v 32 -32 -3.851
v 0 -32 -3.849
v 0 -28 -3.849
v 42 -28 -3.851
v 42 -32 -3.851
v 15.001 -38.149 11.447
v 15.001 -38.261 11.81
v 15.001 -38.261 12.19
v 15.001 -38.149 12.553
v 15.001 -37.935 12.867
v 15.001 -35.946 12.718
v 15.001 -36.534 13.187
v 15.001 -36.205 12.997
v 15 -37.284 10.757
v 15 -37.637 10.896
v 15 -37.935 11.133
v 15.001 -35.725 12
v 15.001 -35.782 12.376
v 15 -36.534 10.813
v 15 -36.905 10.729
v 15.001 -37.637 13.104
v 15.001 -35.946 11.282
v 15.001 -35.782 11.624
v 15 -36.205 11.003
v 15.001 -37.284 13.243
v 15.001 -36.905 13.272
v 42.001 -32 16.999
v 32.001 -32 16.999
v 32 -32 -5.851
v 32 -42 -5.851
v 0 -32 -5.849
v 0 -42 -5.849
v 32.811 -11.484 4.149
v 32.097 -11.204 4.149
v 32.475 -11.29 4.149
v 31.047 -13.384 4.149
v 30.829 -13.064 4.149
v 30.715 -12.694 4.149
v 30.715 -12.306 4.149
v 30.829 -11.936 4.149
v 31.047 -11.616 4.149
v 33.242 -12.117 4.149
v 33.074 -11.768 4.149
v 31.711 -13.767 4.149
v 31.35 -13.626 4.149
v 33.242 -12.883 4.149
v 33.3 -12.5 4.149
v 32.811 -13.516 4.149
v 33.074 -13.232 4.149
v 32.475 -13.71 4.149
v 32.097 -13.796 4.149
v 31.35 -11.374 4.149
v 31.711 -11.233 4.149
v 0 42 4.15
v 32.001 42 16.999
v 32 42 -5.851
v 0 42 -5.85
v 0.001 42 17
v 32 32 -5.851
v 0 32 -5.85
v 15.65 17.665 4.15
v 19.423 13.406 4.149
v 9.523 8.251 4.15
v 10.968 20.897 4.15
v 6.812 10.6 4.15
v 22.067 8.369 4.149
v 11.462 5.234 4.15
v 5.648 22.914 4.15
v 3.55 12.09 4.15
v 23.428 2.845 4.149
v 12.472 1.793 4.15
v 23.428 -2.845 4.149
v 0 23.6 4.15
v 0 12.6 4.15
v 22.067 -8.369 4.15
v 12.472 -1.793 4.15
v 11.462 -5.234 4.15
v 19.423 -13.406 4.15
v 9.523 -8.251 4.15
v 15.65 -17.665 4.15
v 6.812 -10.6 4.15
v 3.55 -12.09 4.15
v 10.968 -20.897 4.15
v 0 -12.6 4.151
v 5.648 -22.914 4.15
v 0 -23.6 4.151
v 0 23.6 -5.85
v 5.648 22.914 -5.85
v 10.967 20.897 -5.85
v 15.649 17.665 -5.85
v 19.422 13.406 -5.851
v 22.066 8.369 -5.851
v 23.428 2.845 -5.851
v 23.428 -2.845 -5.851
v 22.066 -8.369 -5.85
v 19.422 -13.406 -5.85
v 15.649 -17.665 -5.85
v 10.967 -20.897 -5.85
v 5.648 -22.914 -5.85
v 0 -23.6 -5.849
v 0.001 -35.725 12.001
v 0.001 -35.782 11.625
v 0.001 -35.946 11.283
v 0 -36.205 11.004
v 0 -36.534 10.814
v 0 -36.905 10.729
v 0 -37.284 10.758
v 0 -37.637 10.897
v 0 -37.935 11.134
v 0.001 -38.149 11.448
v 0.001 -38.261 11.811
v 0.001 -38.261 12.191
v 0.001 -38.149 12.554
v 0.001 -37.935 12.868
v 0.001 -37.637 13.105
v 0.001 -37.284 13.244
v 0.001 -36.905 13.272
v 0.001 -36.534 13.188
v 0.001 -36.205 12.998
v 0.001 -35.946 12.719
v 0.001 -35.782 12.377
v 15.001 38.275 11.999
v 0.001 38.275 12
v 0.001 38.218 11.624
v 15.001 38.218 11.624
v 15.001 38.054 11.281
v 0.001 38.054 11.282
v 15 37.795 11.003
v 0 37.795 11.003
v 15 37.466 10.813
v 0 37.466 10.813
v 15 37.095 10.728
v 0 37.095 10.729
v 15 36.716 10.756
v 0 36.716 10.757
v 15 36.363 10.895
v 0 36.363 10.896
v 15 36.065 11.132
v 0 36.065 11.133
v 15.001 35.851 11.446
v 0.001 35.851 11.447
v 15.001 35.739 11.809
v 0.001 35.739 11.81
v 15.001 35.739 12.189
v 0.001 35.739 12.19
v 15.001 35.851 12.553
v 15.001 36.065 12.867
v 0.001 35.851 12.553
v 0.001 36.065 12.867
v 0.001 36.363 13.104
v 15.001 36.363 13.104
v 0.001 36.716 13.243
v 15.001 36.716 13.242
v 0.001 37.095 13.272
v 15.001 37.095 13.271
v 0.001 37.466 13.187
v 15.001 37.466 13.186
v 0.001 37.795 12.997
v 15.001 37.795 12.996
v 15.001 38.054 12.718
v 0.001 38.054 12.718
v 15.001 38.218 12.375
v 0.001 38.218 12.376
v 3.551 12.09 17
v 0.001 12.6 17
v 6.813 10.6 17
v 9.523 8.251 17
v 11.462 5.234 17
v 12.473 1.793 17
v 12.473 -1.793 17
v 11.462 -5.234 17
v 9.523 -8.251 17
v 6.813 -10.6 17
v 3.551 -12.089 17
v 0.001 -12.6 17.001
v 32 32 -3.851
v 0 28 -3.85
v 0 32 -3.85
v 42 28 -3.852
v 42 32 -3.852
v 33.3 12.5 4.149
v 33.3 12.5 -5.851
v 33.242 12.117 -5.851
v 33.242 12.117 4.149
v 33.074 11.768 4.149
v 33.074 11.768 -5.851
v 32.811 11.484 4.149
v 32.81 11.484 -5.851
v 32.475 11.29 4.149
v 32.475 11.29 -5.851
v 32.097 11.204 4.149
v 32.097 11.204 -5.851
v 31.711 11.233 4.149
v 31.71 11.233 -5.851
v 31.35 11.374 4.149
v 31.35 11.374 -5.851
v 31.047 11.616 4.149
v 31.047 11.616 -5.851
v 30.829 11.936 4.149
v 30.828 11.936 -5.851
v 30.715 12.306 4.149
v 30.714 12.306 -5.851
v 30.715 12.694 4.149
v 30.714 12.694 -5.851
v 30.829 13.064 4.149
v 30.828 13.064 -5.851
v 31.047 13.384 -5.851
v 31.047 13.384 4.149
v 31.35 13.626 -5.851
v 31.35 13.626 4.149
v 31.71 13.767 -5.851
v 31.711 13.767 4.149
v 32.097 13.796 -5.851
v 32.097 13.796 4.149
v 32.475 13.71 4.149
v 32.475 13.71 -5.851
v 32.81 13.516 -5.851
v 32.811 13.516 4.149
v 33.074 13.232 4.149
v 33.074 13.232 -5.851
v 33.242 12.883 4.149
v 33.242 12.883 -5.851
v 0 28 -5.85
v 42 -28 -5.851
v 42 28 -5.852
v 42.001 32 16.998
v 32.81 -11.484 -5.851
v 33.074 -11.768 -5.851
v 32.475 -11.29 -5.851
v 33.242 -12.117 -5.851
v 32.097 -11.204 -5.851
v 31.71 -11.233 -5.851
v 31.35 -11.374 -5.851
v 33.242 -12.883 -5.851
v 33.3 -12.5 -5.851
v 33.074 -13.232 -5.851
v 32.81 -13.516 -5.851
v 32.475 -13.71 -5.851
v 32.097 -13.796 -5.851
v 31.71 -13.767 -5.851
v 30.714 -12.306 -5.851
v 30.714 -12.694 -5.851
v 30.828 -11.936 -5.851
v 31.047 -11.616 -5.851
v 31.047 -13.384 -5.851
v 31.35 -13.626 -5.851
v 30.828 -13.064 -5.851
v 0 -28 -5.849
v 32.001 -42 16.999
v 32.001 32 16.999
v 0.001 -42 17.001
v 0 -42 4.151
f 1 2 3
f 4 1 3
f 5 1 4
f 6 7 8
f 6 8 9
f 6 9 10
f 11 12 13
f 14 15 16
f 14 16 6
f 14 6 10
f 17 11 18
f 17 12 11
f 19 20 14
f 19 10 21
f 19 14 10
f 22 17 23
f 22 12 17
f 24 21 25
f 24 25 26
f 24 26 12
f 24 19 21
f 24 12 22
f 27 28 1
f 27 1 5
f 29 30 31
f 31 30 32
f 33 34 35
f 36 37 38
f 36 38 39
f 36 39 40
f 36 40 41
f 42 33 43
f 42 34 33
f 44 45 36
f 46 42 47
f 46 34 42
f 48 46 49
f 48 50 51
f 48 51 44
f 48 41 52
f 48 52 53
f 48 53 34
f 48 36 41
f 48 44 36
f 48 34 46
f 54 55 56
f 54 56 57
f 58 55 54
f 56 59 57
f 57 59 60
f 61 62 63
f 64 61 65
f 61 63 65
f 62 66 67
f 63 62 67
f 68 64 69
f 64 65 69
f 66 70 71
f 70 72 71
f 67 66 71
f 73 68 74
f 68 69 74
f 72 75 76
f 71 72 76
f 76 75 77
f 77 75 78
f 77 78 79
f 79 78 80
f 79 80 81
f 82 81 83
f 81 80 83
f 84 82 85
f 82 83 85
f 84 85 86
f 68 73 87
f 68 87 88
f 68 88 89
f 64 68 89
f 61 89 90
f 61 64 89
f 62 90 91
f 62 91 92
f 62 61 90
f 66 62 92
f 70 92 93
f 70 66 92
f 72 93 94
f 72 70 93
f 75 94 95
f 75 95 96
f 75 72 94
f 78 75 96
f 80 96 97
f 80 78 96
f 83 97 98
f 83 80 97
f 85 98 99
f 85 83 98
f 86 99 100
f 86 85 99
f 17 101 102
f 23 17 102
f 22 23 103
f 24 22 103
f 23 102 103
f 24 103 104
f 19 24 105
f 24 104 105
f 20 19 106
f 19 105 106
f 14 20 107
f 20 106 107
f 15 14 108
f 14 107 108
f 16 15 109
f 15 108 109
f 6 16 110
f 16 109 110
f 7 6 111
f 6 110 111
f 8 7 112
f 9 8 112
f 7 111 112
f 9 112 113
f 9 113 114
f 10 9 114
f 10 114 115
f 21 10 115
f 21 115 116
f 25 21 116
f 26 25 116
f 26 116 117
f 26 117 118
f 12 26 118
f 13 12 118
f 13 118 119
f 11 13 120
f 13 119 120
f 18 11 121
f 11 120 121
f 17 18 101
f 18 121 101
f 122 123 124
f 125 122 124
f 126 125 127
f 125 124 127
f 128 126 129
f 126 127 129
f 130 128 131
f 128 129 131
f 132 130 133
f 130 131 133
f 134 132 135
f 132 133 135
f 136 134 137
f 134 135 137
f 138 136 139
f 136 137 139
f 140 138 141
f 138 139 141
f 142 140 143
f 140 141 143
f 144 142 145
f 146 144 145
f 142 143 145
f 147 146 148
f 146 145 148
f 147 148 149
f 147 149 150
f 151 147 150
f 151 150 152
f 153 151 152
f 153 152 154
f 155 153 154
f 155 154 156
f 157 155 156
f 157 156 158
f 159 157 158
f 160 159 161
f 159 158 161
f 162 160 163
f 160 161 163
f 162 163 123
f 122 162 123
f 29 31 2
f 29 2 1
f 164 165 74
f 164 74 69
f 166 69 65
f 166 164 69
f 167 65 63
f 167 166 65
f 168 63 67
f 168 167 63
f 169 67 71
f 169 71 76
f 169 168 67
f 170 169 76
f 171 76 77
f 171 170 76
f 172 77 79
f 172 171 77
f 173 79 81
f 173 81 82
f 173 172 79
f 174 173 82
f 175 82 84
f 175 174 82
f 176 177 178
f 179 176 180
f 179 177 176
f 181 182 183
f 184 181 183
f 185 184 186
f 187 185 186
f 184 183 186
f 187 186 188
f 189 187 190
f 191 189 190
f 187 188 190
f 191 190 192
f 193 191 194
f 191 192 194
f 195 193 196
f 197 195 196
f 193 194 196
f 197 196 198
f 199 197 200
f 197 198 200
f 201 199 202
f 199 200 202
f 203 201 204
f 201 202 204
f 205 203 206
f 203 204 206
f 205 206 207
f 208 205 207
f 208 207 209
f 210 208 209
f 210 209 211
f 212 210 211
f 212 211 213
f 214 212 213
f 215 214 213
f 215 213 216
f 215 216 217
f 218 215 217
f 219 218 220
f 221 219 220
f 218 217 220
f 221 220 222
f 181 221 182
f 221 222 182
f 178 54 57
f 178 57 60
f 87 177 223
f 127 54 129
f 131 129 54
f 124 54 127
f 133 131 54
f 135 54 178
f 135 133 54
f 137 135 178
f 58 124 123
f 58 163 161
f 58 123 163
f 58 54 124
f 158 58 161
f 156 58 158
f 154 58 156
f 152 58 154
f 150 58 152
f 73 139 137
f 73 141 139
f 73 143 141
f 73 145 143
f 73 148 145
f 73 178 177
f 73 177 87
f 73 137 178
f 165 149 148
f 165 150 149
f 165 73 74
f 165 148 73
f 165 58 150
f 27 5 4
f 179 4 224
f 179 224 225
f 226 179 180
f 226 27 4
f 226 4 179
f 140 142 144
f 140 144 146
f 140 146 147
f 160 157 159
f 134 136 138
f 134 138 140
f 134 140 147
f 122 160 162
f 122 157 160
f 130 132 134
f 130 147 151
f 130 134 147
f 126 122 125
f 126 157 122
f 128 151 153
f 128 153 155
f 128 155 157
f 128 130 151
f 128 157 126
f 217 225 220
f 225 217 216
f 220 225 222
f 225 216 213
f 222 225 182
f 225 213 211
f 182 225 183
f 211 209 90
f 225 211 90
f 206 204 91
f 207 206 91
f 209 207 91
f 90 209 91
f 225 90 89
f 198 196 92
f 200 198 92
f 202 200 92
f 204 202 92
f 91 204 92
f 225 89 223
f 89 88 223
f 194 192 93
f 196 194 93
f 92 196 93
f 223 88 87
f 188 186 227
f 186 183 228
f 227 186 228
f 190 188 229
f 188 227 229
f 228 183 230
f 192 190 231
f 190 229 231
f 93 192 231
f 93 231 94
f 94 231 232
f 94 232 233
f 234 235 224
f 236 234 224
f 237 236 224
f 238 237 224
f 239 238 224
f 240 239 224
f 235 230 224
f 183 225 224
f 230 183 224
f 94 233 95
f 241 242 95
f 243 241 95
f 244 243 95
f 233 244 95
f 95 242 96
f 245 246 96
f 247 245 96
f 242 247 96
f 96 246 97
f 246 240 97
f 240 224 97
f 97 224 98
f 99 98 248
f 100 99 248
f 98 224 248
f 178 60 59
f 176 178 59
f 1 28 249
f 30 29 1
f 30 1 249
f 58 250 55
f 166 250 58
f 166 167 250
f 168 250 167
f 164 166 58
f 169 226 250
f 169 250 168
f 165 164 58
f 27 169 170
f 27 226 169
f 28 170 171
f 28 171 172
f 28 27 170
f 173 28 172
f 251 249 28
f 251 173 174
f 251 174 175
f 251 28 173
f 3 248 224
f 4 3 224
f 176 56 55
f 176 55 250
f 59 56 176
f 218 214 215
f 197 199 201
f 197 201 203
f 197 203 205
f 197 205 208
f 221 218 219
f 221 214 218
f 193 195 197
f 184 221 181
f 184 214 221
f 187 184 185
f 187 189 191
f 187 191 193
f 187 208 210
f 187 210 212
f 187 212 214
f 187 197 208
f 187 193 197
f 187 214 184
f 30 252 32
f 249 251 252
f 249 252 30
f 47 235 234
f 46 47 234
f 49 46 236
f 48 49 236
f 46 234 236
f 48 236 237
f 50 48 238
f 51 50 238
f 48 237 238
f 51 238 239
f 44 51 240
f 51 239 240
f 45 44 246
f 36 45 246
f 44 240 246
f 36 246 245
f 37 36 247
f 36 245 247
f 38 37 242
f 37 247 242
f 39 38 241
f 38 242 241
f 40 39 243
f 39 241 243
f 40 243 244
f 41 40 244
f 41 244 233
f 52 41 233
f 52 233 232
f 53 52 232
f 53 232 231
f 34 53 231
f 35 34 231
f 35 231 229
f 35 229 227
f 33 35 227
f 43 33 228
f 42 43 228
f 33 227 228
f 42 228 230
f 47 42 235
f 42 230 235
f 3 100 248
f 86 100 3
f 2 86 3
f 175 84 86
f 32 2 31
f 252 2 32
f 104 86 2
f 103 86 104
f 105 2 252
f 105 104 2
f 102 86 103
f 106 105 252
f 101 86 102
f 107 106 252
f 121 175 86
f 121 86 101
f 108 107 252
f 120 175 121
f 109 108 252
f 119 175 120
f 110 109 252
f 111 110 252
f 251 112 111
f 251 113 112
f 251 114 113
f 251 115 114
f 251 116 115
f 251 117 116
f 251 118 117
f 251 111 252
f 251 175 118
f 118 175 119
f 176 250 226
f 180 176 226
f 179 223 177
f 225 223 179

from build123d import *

# Parameters (mm, degrees)
PAD008_DEPTH    = 12.85
PAD009_DEPTH    = 10
SKETCH021_R     = 1.275
POCKET006_DEPTH = 15
SKETCH022_W     = 42
SKETCH022_H     = 4
POCKET007_DEPTH = 2
SKETCH027_R     = 1.3
POCKET011_DEPTH = 10
SKETCH028_W     = 10
SKETCH028_H     = 10
POCKET012_DEPTH = 22.8536497878


with BuildPart() as part:
    # Sketch012 (on DatumPlane) → Pad008 (new body)
    with BuildSketch(Plane(origin=(0.0007630761, 0.000154743, 17.0004579694), x_dir=(0.999999999, -4e-10, -4.48856e-05), z_dir=(-4.48856e-05, -9.1023e-06, -0.999999999))):
        with BuildLine():
            Line((0, 42), (42, 42))
            Line((42, 42), (42, -42))
            Line((42, -42), (0, -42))
            Line((0, -42), (0, -12.6))
            ThreePointArc((0, -12.6), (12.6, 0), (0, 12.6))
            Line((0, 42), (0, 12.6))
        make_face()
    extrude(amount=PAD008_DEPTH)

    # Sketch013 (on Face8 of Pad008) → Pad009 (join)
    with BuildSketch(Plane(origin=(0.0001862959, 3.77787e-05, 4.1504579829), x_dir=(0.999999999, -4e-10, -4.48856e-05), z_dir=(-4.48856e-05, -9.1023e-06, -0.999999999))):
        with BuildLine():
            ThreePointArc((0, -23.6), (23.6, 0), (0, 23.6))
            Line((0, 23.6), (0, 42))
            Line((0, 42), (42, 42))
            Line((42, 42), (42, -42))
            Line((42, -42), (0, -42))
            Line((0, -42), (0, -23.6))
        make_face()
    extrude(amount=PAD009_DEPTH)

    # Sketch021 (on Face7 of Pad009) → Pocket006 (cut)
    with BuildSketch(Plane(origin=(0.0007630761, 0.000154743, 17.0004579694), x_dir=(0, 1, -9.1023e-06), z_dir=(-0.999999999, 4e-10, 4.48856e-05))):
        with Locations((-37, 5)):
            Circle(SKETCH021_R)
        with Locations((37, 5)):
            Circle(SKETCH021_R)
    extrude(amount=-POCKET006_DEPTH, mode=Mode.SUBTRACT)

    # Sketch022 (on Face8 of Pocket006) → Pocket007 (cut)
    with BuildSketch(Plane(origin=(-0.0002625603, -5.32442e-05, -5.8495420067), x_dir=(0.999999999, -4e-10, -4.48856e-05), z_dir=(-4.48856e-05, -9.1023e-06, -0.999999999))):
        with Locations((21, 30)):
            Rectangle(SKETCH022_W, SKETCH022_H)
        with Locations((21, -30)):
            Rectangle(SKETCH022_W, SKETCH022_H)
    extrude(amount=-POCKET007_DEPTH, mode=Mode.SUBTRACT)

    # Sketch027 (on Face13 of Pocket007) → Pocket011 (cut)
    with BuildSketch(Plane(origin=(-0.0002625603, -5.32442e-05, -5.8495420067), x_dir=(0.999999999, -4e-10, -4.48856e-05), z_dir=(-4.48856e-05, -9.1023e-06, -0.999999999))):
        with Locations((32, 12.5)):
            Circle(SKETCH027_R)
        with Locations((32, -12.5)):
            Circle(SKETCH027_R)
    extrude(amount=-POCKET011_DEPTH, mode=Mode.SUBTRACT)

    # Sketch028 (on Face9 of Pocket011) → Pocket012 (cut, through all)
    with BuildSketch(Plane(origin=(-0.0002625603, -5.32442e-05, -5.8495420067), x_dir=(0.999999999, -4e-10, -4.48856e-05), z_dir=(-4.48856e-05, -9.1023e-06, -0.999999999))):
        with Locations((37, -37)):
            Rectangle(SKETCH028_W, SKETCH028_H)
        with Locations((37, 37)):
            Rectangle(SKETCH028_W, SKETCH028_H)
    extrude(amount=-POCKET012_DEPTH, mode=Mode.SUBTRACT)


solid = part.part
